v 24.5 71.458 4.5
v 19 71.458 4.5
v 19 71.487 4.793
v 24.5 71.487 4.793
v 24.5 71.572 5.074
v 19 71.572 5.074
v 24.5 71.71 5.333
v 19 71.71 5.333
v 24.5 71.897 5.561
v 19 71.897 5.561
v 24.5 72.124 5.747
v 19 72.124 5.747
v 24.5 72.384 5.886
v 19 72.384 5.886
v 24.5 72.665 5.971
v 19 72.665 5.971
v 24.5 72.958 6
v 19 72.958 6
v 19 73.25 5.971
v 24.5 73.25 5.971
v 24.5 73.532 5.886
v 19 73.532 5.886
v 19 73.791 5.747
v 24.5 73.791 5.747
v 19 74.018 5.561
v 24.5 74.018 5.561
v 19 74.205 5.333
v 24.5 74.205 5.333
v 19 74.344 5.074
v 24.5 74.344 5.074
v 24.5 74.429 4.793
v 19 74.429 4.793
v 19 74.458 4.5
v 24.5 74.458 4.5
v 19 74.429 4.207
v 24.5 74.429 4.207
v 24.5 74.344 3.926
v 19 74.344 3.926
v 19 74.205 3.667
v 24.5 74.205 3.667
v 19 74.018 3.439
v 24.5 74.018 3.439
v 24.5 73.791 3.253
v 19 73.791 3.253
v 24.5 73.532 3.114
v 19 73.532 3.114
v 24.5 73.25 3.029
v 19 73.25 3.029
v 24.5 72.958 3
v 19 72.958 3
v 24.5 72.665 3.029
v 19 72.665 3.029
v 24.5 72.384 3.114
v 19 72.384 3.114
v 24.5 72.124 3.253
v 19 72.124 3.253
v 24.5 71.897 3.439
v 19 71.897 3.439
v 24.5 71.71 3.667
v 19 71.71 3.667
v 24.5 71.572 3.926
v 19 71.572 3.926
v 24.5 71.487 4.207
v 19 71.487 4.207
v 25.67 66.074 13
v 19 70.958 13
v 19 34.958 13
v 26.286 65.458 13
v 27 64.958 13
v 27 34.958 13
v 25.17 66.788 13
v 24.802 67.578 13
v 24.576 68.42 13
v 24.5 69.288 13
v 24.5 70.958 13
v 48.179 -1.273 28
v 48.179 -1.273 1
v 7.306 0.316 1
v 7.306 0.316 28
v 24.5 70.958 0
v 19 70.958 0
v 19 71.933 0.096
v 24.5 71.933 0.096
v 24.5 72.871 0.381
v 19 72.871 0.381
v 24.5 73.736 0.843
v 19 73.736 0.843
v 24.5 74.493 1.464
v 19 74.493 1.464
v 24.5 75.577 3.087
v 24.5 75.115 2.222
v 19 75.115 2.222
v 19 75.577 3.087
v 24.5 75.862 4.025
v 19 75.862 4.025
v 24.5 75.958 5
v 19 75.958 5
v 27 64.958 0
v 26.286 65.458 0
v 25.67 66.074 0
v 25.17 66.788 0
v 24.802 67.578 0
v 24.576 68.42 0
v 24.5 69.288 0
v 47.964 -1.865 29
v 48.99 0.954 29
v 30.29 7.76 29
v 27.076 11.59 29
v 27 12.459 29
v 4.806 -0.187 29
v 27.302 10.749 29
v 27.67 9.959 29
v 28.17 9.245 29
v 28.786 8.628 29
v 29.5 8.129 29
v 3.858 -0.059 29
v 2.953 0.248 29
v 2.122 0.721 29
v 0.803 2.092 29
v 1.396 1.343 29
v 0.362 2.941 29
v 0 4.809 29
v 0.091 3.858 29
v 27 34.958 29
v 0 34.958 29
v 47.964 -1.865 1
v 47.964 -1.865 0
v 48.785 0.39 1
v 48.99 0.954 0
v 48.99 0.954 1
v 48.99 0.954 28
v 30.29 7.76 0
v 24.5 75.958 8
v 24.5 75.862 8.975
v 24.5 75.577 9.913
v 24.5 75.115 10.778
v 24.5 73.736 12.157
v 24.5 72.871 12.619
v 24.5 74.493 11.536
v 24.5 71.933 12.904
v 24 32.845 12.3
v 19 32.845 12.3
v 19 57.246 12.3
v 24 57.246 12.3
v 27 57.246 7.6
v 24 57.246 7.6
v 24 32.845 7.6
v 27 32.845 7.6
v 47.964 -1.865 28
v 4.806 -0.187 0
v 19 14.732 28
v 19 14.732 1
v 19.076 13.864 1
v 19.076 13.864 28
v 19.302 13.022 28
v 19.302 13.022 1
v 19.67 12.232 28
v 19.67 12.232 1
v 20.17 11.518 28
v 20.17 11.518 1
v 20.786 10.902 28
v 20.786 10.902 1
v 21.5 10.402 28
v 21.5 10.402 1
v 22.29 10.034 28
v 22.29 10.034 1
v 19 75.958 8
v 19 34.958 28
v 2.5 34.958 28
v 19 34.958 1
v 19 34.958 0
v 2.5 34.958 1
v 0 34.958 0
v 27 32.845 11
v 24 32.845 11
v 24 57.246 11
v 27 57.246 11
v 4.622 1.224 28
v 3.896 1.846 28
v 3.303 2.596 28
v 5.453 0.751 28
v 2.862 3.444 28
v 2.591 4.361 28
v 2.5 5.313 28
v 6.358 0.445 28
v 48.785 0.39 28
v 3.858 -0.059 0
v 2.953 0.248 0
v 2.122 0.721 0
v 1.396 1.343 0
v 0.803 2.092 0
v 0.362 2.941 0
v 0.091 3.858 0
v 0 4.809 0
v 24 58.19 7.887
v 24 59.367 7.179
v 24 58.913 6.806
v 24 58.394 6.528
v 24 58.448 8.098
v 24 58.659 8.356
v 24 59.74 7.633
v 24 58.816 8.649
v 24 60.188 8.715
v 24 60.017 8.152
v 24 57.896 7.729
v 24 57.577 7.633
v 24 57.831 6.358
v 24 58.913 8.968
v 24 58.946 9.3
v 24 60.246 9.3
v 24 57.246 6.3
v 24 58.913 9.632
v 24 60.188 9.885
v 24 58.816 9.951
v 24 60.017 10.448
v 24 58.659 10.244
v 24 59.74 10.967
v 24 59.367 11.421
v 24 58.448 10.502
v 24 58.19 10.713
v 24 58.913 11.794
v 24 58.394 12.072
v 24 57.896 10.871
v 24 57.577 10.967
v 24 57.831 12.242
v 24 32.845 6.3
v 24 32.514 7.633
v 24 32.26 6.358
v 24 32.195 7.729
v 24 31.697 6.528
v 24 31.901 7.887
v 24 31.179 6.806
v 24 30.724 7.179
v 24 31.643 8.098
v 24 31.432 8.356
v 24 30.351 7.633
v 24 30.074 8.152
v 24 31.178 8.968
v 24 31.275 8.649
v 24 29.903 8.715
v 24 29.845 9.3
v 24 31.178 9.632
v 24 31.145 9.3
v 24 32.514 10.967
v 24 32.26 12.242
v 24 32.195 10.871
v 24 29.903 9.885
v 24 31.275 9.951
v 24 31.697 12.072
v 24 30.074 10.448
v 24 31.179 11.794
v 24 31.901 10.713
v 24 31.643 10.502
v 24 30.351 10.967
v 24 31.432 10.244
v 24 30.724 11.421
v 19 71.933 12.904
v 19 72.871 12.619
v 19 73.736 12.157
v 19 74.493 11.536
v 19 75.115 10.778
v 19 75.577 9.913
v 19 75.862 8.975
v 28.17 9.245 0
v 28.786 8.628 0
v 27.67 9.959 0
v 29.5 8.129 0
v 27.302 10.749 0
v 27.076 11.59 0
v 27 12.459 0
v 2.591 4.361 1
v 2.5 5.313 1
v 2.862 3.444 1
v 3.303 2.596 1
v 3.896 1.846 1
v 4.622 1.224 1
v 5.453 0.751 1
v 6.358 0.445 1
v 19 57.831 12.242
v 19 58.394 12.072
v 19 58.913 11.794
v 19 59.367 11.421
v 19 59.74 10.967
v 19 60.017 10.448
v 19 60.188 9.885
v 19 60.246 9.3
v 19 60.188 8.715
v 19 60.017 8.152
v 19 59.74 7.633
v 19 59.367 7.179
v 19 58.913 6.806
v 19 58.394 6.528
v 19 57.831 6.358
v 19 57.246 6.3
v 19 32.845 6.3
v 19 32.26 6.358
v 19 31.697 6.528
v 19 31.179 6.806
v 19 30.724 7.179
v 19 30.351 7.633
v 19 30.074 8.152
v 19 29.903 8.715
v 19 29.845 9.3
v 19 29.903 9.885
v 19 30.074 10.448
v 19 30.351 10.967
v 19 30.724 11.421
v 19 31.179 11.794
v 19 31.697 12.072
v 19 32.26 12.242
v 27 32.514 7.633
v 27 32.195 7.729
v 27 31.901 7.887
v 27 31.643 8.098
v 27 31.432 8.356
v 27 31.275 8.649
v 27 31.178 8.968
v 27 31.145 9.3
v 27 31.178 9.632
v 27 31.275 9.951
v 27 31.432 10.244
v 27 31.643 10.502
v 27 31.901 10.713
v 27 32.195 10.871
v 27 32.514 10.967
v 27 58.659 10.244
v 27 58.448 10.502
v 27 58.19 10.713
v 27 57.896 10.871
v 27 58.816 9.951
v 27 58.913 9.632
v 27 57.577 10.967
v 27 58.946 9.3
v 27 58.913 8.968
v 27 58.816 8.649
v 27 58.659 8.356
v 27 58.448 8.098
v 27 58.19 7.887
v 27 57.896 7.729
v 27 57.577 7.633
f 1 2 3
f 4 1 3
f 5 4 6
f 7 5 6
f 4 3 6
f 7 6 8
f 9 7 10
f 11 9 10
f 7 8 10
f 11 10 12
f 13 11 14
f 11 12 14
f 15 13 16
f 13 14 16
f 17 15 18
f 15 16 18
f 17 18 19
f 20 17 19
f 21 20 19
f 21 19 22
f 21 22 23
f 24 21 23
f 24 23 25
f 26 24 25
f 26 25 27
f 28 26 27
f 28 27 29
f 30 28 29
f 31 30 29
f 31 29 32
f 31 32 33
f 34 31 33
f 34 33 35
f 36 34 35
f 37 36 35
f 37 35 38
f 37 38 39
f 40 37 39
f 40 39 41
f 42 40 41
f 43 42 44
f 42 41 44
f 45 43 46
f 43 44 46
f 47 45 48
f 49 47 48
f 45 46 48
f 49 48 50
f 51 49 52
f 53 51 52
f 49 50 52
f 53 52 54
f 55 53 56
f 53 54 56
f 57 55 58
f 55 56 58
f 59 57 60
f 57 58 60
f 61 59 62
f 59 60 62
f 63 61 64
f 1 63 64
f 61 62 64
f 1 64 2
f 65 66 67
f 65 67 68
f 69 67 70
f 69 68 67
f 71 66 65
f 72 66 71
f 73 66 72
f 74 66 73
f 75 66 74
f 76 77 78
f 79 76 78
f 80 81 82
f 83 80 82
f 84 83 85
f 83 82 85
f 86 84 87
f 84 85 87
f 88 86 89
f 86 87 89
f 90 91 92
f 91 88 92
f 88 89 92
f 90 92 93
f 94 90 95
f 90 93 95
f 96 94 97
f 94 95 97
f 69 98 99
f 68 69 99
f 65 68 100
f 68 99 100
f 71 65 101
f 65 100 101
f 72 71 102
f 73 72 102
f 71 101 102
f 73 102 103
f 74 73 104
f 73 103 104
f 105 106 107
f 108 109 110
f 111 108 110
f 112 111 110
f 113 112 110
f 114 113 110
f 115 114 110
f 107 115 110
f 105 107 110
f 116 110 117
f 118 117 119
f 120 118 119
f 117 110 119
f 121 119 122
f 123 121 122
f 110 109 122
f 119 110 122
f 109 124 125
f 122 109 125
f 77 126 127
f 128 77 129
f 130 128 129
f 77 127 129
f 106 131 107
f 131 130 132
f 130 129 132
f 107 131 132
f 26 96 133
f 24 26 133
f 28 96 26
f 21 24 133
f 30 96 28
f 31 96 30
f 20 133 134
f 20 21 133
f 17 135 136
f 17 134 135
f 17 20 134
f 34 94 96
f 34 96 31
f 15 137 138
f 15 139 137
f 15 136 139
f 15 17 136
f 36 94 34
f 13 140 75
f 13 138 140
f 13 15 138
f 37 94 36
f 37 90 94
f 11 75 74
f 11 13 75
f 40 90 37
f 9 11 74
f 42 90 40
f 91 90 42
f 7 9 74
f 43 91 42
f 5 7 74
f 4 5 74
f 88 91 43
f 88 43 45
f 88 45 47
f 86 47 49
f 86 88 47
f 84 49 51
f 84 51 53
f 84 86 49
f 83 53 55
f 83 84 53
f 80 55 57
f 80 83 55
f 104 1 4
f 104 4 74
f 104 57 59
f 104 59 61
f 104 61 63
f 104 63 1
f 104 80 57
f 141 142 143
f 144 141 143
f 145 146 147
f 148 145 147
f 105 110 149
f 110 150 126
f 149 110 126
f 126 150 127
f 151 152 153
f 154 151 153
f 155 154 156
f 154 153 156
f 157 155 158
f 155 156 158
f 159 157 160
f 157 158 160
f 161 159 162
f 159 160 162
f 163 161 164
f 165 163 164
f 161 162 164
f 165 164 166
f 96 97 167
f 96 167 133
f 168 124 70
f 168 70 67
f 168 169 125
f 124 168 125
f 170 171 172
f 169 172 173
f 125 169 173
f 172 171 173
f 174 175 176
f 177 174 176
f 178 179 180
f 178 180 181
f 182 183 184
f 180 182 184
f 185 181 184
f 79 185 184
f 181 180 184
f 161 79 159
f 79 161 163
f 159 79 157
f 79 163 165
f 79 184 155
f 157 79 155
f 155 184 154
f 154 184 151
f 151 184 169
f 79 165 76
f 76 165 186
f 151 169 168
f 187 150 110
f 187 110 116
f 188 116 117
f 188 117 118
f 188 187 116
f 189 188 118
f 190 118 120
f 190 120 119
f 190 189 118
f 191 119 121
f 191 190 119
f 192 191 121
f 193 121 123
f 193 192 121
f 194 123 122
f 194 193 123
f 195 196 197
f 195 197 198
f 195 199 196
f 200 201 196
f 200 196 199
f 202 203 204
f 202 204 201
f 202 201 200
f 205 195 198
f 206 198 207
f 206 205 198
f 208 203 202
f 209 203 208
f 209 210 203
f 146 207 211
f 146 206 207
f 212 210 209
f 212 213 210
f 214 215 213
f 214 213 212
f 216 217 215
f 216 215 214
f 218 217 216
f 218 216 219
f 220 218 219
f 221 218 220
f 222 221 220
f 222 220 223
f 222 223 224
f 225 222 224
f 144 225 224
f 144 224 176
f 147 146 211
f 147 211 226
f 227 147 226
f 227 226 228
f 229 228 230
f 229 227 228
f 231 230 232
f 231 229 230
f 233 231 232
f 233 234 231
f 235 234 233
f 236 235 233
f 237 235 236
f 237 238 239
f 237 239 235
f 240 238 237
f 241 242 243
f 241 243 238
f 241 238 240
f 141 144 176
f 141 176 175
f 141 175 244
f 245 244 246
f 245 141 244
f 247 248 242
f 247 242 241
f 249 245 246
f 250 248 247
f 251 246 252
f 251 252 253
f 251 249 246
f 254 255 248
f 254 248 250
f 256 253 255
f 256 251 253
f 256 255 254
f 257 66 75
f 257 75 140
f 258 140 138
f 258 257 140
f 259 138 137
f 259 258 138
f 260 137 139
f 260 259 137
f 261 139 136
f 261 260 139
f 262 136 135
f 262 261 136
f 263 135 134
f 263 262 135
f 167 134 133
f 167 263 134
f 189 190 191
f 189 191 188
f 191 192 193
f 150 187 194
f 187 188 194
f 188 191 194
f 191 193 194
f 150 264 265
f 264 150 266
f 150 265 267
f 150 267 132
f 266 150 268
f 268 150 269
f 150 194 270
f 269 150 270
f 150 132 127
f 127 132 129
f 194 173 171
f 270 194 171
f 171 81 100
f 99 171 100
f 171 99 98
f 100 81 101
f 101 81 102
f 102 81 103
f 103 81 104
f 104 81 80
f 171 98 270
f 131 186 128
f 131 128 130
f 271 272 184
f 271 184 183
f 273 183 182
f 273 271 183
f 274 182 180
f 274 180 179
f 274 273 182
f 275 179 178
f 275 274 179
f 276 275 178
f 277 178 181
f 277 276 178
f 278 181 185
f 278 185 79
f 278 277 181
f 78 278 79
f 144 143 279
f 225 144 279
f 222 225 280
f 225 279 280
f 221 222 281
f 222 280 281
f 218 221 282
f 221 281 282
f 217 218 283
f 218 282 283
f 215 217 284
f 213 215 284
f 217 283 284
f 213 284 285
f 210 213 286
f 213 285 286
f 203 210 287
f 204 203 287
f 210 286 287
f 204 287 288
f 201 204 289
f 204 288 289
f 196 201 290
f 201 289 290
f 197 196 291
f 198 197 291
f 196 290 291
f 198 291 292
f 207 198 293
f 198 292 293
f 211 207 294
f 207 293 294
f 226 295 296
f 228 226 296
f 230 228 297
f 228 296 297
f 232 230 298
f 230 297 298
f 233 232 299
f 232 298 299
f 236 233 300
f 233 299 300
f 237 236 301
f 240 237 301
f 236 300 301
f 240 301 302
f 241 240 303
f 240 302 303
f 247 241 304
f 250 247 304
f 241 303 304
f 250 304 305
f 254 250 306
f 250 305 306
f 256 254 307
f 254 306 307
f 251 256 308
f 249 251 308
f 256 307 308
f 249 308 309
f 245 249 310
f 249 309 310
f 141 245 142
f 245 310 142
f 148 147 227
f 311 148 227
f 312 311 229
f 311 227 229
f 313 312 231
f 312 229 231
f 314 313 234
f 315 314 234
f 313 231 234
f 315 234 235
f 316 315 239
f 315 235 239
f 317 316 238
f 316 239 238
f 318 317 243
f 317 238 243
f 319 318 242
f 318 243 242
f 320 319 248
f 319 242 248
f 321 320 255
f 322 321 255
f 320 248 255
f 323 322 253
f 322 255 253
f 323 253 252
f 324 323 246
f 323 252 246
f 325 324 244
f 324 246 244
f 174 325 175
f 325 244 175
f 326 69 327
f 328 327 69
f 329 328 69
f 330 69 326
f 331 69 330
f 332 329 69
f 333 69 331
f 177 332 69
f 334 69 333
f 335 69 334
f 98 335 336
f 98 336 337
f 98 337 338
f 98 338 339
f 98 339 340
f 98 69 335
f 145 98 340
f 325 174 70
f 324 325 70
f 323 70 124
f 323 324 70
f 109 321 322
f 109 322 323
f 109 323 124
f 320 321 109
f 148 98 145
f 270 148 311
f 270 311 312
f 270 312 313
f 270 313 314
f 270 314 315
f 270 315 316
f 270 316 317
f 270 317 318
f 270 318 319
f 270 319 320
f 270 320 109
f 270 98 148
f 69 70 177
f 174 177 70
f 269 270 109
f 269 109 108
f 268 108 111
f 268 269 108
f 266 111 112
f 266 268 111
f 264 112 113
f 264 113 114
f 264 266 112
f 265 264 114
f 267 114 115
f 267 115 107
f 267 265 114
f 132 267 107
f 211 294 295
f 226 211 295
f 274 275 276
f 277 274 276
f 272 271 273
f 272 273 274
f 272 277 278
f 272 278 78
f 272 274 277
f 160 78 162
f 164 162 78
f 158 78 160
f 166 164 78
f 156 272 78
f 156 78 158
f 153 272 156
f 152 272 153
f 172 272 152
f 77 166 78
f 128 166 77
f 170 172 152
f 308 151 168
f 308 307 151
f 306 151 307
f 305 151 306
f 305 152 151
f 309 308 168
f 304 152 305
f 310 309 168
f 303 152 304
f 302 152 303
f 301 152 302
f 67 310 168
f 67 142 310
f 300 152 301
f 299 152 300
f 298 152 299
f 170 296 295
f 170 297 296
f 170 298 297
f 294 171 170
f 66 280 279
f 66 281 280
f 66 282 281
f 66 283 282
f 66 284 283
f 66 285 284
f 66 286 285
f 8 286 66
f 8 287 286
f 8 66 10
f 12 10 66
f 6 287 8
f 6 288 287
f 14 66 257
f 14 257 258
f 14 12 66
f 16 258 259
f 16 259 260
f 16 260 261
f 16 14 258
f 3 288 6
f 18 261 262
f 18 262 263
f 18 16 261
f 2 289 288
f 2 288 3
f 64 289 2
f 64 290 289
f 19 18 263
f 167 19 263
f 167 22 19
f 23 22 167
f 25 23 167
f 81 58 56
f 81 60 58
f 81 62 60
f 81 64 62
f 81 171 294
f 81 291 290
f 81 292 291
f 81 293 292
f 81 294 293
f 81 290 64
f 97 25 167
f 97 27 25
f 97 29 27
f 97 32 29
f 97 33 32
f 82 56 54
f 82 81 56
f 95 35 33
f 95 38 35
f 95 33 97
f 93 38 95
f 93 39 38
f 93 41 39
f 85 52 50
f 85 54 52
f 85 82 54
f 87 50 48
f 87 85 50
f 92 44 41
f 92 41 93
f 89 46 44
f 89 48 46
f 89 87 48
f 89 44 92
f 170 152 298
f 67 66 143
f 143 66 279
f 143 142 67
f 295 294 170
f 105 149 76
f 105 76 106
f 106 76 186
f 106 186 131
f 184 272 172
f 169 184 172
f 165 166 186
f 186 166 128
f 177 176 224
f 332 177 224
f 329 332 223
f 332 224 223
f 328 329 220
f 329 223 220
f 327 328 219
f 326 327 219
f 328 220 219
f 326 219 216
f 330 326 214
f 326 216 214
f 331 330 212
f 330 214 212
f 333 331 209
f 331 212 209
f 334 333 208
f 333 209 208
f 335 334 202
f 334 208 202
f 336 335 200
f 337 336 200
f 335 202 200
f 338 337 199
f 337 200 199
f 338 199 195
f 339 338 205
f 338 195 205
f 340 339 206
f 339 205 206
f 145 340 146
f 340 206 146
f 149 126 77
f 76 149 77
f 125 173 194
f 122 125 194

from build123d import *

# Parameters (mm, degrees)
F1_DEPTH      = 1
F3_DEPTH      = 27
F5_DEPTH      = 1
F7_DEPTH      = 13
F8_R          = 1.5
F9_DEPTH      = 25
F10_DEPTH     = 5
F11_T1_DEPTH  = 29
F11_T3_DEPTH  = 13
F11_T5_DEPTH  = 27
F11_T7_DEPTH  = 30.5
F11_T9_DEPTH  = 30.5
F11_T11_DEPTH = 53.0467878714
F11_T13_DEPTH = 27


# Not quite as in the source:
# - a fillet or chamfer that OpenCascade refuses, or shapes differently, is made with other operations: its cross-section is extruded or revolved along the edge and cut away or added


with BuildPart() as f1:
    # F0 (on Top) → F1 (new body)
    with BuildSketch(Plane.XY):
        Polygon((0, 34.9576839236), (0, 0), (47.9637535727, -1.8650316928), (48.9898140027, 0.9540461696), (27, 8.9576839236), (27, 34.9576839236), align=None)
    extrude(amount=F1_DEPTH)

    # F2 (on face) → F3 (join)
    with BuildSketch(Plane.XY.offset(1)):
        Polygon((2.5, 34.9576839236), (0, 34.9576839236), (0, 0), (47.9637535727, -1.8650316928), (48.1792508796, -1.2729577082), (2.5, 0.5032429485), align=None)
        Polygon((27, 34.9576839236), (19, 34.9576839236), (19, 11.2309391343), (48.7846019167, 0.3902305971), (48.9898140027, 0.9540461696), (27, 8.9576839236), align=None)
    extrude(amount=F3_DEPTH)

    # F4 (on face) → F5 (join)
    with BuildSketch(Plane.XY.offset(28)):
        Polygon((0, 34.9576839236), (0, 0), (47.9637535727, -1.8650316928), (48.9898140027, 0.9540461696), (27, 8.9576839236), (27, 34.9576839236), align=None)
    extrude(amount=F5_DEPTH)

    # F6 (on face) → F7 (join)
    with BuildSketch(Plane(origin=(0, 0, 0), x_dir=(1, 0, 0), z_dir=(0, 0, -1))):
        Polygon((27, -64.9576839236), (27, -34.9576839236), (19, -34.9576839236), (19, -75.9576839236), (24.5, -75.9576839236), (24.5, -64.9576839236), align=None)
    extrude(amount=-F7_DEPTH)

    # F8 (on face) → F9 (cut)
    with BuildSketch(Plane(origin=(19, 0, 0), x_dir=(0, -1, 0), z_dir=(-1, 0, 0))):
        with Locations((-72.9576839236, 4.5)):
            Circle(F8_R)
        with BuildLine():
            Line((-32.8452885151, 11), (-57.2458393872, 11))
            ThreePointArc((-57.2458393872, 11), (-58.9458393872, 9.3), (-57.2458393872, 7.6))
            Line((-57.2458393872, 7.6), (-32.8452885151, 7.6))
            ThreePointArc((-32.8452885151, 7.6), (-31.1452885151, 9.3), (-32.8452885151, 11))
        make_face()
    extrude(amount=-F9_DEPTH, mode=Mode.SUBTRACT)

    # F8 (on face) → F10 (cut)
    with BuildSketch(Plane(origin=(19, 0, 0), x_dir=(0, -1, 0), z_dir=(-1, 0, 0))):
        with BuildLine():
            Line((-32.8452885151, 12.3), (-57.2458393872, 12.3))
            ThreePointArc((-57.2458393872, 12.3), (-60.2458393872, 9.3), (-57.2458393872, 6.3))
            Line((-57.2458393872, 6.3), (-32.8452885151, 6.3))
            ThreePointArc((-32.8452885151, 6.3), (-29.8452885151, 9.3), (-32.8452885151, 12.3))
        make_face()
        with BuildLine():
            ThreePointArc((-57.2458393872, 7.6), (-58.9458393872, 9.3), (-57.2458393872, 11))
            Line((-57.2458393872, 11), (-32.8452885151, 11))
            ThreePointArc((-32.8452885151, 11), (-31.1452885151, 9.3), (-32.8452885151, 7.6))
            Line((-32.8452885151, 7.6), (-57.2458393872, 7.6))
        make_face(mode=Mode.SUBTRACT)
    extrude(amount=-F10_DEPTH, mode=Mode.SUBTRACT)

    # F11: fillet of radius 5 on 7 edges, made by hand

    # F11_s2 → F11_t1 (join)
    with BuildSketch(Plane.XY):
        with BuildLine():
            ThreePointArc((27, 12.4587216147), (27.9042397786, 9.5908394329), (30.2898992834, 7.7602585108))
            Line((30.2898992834, 7.7602585108), (27, 8.9576839236))
            Line((27, 8.9576839236), (27, 12.4587216147))
        make_face()
    extrude(amount=F11_T1_DEPTH)

    # F11_s4 → F11_t3 (join)
    with BuildSketch(Plane.XY):
        with BuildLine():
            ThreePointArc((27, 64.9576839236), (25.1698729811, 66.7878109426), (24.5, 69.2878109426))
            Line((24.5, 69.2878109426), (24.5, 64.9576839236))
            Line((24.5, 64.9576839236), (27, 64.9576839236))
        make_face()
    extrude(amount=F11_T3_DEPTH)

    # F11_s6 → F11_t5 (join)
    with BuildSketch(Plane.XY.offset(1)):
        with BuildLine():
            ThreePointArc((2.5, 5.3126005228), (3.8964343579, 1.8464333797), (7.3057258653, 0.3163761923))
            Line((7.3057258653, 0.3163761923), (2.5, 0.5032429485))
            Line((2.5, 0.5032429485), (2.5, 5.3126005228))
        make_face()
    extrude(amount=F11_T5_DEPTH)

    # F11_s8 → F11_t7 (cut)
    with BuildSketch(Plane.YZ.offset(6.5)):
        with BuildLine():
            ThreePointArc((70.9576839236, 0), (74.4932178296, 1.4644660941), (75.9576839236, 5))
            Line((75.9576839236, 5), (75.9576839236, 0))
            Line((75.9576839236, 0), (70.9576839236, 0))
        make_face()
    extrude(amount=F11_T7_DEPTH, mode=Mode.SUBTRACT)

    # F11_s10 → F11_t9 (cut)
    with BuildSketch(Plane.YZ.offset(6.5)):
        with BuildLine():
            ThreePointArc((70.9576839236, 13), (74.4932178296, 11.5355339059), (75.9576839236, 8))
            Line((75.9576839236, 8), (75.9576839236, 13))
            Line((75.9576839236, 13), (70.9576839236, 13))
        make_face()
    extrude(amount=F11_T9_DEPTH, mode=Mode.SUBTRACT)

    # F11_s12 → F11_t11 (cut)
    with BuildSketch(Plane.XY.offset(-12.0233939357)):
        with BuildLine():
            ThreePointArc((4.8057258653, -0.1868667562), (1.3964343579, 1.3431904313), (0, 4.8093575743))
            Line((0, 4.8093575743), (0, 0))
            Line((0, 0), (4.8057258653, -0.1868667562))
        make_face()
    extrude(amount=F11_T11_DEPTH, mode=Mode.SUBTRACT)

    # F11_s14 → F11_t13 (cut)
    with BuildSketch(Plane.XY.offset(1)):
        with BuildLine():
            ThreePointArc((19, 14.7319768253), (19.9042397786, 11.8640946436), (22.2898992834, 10.0335137214))
            Line((22.2898992834, 10.0335137214), (19, 11.2309391343))
            Line((19, 11.2309391343), (19, 14.7319768253))
        make_face()
    extrude(amount=F11_T13_DEPTH, mode=Mode.SUBTRACT)


solid = f1.part
